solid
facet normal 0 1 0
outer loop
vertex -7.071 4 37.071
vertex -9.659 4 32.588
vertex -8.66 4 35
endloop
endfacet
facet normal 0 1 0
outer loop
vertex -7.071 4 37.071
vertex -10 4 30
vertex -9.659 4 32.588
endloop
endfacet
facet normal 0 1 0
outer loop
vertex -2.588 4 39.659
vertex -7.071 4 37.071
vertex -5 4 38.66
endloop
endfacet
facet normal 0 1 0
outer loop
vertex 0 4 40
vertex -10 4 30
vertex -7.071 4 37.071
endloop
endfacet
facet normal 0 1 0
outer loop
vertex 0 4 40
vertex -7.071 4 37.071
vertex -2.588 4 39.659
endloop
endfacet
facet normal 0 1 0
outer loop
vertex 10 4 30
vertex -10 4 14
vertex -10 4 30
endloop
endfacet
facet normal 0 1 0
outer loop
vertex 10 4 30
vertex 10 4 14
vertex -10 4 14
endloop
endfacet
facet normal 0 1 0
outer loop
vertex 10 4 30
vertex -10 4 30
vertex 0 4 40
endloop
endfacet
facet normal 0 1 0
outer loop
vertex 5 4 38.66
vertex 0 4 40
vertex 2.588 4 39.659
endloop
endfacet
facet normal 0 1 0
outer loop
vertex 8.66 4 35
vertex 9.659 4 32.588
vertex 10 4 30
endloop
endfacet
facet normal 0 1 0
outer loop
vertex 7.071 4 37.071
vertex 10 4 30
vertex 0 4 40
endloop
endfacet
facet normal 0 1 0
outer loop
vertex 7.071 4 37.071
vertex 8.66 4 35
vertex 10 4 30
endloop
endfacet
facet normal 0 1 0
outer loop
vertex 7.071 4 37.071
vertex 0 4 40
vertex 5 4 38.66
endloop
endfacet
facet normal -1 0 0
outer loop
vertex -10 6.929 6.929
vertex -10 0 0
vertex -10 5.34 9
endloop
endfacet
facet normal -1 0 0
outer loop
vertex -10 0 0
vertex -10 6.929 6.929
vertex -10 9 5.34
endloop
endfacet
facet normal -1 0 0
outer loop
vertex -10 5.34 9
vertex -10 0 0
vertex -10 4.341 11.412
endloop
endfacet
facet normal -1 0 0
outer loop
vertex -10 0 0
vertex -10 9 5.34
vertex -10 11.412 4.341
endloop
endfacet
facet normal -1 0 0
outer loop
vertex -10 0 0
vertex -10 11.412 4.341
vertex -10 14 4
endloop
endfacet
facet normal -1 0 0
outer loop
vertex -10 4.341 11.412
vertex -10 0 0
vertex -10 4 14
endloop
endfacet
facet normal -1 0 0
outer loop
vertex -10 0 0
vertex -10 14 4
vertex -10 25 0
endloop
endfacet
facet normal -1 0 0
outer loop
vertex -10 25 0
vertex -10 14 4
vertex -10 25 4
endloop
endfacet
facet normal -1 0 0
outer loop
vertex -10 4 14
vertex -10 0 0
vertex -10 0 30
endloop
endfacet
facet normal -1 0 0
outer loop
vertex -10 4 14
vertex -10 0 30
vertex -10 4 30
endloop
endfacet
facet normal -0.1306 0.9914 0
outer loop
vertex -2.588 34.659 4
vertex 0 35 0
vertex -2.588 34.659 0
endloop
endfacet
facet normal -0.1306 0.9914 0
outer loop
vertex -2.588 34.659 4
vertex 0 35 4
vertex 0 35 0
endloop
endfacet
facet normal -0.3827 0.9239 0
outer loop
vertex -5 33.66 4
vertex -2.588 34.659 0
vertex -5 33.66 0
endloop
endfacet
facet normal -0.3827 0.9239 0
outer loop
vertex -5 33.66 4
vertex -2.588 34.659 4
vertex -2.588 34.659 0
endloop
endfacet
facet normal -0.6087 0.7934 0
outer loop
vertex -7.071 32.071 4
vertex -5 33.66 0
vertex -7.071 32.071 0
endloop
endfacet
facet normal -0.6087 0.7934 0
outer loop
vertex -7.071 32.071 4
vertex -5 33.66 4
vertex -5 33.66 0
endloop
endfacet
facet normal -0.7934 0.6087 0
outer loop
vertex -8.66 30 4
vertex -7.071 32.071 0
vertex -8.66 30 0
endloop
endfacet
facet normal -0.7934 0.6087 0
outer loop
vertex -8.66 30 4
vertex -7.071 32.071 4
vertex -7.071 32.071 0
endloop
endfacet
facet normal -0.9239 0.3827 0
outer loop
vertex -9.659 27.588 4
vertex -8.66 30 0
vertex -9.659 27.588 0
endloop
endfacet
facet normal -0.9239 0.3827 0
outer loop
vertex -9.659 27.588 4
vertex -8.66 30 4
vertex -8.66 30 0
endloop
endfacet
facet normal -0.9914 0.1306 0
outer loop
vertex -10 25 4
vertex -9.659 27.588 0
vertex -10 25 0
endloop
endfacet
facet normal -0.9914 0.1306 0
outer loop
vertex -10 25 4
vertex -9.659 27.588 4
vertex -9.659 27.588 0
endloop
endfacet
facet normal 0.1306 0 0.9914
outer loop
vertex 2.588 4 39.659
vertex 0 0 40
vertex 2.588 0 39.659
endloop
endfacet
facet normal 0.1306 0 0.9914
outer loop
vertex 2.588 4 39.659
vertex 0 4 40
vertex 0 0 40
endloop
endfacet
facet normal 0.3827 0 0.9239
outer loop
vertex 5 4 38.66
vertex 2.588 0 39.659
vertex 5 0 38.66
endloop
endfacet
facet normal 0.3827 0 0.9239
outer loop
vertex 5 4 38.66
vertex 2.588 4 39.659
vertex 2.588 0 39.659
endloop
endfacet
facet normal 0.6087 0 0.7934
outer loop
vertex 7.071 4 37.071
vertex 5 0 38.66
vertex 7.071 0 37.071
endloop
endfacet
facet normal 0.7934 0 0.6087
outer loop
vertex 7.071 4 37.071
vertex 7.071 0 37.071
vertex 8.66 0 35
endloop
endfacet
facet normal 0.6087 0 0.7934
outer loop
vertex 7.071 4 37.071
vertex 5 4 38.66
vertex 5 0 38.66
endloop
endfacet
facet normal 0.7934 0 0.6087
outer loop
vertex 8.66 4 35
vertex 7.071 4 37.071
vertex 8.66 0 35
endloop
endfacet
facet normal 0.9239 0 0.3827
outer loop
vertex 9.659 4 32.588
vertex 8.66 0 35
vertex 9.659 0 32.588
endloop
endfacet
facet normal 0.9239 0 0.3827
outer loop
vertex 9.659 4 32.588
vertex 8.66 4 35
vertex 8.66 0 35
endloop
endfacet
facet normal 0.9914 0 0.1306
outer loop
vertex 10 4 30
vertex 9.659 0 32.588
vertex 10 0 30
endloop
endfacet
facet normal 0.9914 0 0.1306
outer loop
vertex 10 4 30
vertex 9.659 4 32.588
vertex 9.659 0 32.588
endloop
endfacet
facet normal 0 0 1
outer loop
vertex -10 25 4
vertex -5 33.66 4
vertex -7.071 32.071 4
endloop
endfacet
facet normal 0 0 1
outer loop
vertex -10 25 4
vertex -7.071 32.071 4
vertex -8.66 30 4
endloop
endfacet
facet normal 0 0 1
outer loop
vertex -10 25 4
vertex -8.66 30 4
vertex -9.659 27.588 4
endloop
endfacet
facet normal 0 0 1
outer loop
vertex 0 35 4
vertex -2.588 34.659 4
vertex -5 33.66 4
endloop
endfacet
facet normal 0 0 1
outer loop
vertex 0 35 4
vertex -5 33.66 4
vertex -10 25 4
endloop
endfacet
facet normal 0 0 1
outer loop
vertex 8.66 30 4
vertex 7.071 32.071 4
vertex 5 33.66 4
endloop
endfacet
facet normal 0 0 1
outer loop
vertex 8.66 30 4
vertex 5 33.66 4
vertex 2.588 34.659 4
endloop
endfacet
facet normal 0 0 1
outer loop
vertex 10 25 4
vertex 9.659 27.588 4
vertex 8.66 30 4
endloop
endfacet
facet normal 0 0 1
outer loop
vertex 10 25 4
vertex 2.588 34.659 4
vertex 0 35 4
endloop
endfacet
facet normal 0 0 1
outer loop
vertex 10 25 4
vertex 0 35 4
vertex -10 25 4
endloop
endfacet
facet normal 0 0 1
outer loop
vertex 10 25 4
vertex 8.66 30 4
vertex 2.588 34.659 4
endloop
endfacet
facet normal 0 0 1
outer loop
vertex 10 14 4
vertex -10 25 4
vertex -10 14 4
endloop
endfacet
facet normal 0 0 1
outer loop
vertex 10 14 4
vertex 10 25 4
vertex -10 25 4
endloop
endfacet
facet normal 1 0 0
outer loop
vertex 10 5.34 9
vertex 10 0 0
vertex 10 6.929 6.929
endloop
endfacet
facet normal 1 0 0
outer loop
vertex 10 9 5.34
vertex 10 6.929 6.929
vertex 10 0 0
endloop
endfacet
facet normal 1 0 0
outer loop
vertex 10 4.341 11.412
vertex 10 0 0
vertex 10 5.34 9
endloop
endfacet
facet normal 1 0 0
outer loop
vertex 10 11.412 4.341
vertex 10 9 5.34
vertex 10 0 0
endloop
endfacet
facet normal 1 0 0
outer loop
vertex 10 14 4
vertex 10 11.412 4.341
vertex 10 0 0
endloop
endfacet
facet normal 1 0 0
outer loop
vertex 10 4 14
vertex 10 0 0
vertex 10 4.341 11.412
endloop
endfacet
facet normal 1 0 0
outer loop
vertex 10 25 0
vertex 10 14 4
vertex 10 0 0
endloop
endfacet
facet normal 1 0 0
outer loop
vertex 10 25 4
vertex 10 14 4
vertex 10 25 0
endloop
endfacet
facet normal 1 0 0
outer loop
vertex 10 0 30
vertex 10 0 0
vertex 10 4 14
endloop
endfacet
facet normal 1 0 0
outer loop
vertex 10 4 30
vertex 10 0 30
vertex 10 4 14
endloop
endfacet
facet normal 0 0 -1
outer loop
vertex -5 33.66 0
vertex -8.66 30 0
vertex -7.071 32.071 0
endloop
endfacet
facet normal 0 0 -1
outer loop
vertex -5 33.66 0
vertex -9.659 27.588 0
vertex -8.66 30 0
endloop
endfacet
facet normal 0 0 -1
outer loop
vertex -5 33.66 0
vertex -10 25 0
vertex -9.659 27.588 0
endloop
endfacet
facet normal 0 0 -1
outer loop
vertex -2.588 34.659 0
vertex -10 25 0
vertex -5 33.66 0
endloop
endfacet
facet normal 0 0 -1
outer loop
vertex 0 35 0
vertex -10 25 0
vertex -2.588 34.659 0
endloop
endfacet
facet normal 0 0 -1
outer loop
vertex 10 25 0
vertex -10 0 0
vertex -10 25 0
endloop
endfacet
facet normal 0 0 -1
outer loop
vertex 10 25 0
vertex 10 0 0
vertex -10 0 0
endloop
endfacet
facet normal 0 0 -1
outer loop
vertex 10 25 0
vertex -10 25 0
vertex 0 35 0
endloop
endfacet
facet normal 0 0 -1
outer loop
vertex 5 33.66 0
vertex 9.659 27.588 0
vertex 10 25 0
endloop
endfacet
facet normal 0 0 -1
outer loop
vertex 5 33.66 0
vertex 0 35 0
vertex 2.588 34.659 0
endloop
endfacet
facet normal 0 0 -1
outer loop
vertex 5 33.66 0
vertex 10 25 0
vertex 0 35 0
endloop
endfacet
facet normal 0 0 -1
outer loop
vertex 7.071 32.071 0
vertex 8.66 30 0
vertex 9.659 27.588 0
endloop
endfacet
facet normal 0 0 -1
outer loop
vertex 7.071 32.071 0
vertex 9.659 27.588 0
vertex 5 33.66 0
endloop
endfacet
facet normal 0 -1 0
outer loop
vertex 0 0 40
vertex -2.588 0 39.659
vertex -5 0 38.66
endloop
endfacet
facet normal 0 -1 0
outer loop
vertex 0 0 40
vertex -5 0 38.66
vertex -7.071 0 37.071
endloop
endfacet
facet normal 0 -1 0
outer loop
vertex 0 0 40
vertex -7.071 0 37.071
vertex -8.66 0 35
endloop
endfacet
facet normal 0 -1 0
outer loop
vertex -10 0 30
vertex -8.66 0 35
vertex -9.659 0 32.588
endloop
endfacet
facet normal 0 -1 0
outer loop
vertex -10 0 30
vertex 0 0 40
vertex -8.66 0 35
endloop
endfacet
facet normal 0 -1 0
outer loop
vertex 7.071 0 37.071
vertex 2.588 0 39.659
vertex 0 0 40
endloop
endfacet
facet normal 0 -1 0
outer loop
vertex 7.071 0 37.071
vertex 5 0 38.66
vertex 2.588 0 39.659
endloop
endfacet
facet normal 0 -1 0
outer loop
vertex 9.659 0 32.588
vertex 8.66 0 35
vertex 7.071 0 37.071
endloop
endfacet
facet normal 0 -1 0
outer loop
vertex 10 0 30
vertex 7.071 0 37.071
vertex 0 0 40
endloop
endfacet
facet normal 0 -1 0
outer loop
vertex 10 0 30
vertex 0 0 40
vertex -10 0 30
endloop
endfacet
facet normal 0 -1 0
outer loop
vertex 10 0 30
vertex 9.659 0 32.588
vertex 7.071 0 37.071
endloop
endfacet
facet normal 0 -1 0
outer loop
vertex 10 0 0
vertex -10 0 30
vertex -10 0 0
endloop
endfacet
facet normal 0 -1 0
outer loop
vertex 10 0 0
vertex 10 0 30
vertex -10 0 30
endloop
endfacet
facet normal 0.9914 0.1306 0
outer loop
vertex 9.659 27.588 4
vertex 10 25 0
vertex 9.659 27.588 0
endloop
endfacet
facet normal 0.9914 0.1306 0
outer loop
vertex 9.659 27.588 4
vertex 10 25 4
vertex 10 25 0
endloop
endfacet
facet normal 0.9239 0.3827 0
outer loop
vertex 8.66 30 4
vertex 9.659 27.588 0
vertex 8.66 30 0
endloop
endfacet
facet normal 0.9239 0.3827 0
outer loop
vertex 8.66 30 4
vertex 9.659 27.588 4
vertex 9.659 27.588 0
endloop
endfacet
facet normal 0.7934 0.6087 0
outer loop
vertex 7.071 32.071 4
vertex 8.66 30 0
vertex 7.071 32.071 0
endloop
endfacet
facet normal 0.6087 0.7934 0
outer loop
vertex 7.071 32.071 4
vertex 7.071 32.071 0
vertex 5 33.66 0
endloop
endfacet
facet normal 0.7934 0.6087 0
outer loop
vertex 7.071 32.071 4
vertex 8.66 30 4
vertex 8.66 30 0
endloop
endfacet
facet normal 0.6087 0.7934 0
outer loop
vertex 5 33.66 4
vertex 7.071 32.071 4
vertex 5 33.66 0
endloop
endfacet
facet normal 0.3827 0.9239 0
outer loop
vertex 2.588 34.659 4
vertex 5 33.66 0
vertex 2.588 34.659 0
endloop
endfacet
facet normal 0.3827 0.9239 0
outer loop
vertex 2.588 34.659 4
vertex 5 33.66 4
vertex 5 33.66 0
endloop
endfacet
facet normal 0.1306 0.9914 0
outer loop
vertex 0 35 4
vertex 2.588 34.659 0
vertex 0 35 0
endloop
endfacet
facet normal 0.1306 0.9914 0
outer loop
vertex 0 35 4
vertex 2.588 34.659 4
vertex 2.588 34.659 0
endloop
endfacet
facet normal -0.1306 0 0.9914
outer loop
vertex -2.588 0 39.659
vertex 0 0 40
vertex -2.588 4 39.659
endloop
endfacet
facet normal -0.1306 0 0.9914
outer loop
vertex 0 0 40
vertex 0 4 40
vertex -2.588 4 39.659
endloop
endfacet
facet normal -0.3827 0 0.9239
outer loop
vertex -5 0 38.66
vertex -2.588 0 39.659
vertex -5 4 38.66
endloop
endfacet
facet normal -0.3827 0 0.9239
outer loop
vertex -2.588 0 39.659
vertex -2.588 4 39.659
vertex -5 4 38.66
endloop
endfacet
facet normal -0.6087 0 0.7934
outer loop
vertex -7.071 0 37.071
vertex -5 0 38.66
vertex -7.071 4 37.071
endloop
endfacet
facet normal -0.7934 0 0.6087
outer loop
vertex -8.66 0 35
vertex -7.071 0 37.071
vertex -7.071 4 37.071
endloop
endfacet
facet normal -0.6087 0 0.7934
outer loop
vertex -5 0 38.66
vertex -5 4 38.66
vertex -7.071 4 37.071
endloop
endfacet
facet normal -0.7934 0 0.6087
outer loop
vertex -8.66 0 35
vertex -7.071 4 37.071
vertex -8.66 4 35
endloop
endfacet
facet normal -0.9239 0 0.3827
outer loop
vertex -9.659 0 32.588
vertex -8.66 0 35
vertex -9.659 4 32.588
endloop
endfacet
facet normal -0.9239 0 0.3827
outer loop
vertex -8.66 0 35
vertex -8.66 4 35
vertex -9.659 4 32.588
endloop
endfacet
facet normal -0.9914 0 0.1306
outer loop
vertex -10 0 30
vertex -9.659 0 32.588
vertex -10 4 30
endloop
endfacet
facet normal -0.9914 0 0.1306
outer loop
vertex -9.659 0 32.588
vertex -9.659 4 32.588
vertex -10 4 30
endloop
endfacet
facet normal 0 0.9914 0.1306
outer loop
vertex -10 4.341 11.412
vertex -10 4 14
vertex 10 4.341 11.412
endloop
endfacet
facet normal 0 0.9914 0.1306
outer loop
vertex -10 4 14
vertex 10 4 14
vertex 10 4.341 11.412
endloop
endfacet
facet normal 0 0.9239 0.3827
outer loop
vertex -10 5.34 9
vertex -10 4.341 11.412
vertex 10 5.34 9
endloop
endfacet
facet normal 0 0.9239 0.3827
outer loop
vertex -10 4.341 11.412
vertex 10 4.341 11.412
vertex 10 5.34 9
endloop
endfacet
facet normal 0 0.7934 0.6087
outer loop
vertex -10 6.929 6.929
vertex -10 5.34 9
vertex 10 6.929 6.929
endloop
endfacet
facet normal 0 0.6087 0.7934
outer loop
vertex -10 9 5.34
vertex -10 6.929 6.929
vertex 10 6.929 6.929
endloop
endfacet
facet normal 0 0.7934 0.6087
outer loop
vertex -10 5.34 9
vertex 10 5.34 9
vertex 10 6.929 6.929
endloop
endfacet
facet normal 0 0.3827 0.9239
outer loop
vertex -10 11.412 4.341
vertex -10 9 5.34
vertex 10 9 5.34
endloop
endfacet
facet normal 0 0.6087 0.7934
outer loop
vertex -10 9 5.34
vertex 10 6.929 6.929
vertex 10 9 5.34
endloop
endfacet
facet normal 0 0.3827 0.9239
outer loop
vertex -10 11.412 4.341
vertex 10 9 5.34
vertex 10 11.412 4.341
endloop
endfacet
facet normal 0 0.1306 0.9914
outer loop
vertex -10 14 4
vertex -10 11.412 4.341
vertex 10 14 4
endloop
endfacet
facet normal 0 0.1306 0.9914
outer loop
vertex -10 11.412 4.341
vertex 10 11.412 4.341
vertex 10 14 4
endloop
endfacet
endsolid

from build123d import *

# Parameters (mm, degrees)
F0_W     = 4
F0_H     = 4
F0_W_2   = 31
F0_H_2   = 36
F1_DEPTH = 10
F2_R     = 9.99999


# Not quite as in the source:
# - a fillet or chamfer is up to 0.001 mm smaller than in the source, because OpenCascade refuses the exact size


with BuildPart() as f1:
    # F0 (on Right) → F1 (new body, symmetric)
    with BuildSketch(Plane.YZ):
        with Locations((2, 2)):
            Rectangle(F0_W, F0_H)
        with Locations((19.5, 2)):
            Rectangle(F0_W_2, F0_H)
        with Locations((2, 22)):
            Rectangle(F0_W, F0_H_2)
    extrude(amount=F1_DEPTH, both=True)

    # F2 (radius 10 in the source; OpenCascade refuses exactly that, so slightly less here)
    f2_edges = [f1.edges().sort_by_distance(p)[0] for p in [
        (0, 4, 4),
        (10, 35, 2),
        (-10, 35, 2),
        (10, 2, 40),
        (-10, 2, 40),
    ]]
    fillet(f2_edges, radius=F2_R)


solid = f1.part
